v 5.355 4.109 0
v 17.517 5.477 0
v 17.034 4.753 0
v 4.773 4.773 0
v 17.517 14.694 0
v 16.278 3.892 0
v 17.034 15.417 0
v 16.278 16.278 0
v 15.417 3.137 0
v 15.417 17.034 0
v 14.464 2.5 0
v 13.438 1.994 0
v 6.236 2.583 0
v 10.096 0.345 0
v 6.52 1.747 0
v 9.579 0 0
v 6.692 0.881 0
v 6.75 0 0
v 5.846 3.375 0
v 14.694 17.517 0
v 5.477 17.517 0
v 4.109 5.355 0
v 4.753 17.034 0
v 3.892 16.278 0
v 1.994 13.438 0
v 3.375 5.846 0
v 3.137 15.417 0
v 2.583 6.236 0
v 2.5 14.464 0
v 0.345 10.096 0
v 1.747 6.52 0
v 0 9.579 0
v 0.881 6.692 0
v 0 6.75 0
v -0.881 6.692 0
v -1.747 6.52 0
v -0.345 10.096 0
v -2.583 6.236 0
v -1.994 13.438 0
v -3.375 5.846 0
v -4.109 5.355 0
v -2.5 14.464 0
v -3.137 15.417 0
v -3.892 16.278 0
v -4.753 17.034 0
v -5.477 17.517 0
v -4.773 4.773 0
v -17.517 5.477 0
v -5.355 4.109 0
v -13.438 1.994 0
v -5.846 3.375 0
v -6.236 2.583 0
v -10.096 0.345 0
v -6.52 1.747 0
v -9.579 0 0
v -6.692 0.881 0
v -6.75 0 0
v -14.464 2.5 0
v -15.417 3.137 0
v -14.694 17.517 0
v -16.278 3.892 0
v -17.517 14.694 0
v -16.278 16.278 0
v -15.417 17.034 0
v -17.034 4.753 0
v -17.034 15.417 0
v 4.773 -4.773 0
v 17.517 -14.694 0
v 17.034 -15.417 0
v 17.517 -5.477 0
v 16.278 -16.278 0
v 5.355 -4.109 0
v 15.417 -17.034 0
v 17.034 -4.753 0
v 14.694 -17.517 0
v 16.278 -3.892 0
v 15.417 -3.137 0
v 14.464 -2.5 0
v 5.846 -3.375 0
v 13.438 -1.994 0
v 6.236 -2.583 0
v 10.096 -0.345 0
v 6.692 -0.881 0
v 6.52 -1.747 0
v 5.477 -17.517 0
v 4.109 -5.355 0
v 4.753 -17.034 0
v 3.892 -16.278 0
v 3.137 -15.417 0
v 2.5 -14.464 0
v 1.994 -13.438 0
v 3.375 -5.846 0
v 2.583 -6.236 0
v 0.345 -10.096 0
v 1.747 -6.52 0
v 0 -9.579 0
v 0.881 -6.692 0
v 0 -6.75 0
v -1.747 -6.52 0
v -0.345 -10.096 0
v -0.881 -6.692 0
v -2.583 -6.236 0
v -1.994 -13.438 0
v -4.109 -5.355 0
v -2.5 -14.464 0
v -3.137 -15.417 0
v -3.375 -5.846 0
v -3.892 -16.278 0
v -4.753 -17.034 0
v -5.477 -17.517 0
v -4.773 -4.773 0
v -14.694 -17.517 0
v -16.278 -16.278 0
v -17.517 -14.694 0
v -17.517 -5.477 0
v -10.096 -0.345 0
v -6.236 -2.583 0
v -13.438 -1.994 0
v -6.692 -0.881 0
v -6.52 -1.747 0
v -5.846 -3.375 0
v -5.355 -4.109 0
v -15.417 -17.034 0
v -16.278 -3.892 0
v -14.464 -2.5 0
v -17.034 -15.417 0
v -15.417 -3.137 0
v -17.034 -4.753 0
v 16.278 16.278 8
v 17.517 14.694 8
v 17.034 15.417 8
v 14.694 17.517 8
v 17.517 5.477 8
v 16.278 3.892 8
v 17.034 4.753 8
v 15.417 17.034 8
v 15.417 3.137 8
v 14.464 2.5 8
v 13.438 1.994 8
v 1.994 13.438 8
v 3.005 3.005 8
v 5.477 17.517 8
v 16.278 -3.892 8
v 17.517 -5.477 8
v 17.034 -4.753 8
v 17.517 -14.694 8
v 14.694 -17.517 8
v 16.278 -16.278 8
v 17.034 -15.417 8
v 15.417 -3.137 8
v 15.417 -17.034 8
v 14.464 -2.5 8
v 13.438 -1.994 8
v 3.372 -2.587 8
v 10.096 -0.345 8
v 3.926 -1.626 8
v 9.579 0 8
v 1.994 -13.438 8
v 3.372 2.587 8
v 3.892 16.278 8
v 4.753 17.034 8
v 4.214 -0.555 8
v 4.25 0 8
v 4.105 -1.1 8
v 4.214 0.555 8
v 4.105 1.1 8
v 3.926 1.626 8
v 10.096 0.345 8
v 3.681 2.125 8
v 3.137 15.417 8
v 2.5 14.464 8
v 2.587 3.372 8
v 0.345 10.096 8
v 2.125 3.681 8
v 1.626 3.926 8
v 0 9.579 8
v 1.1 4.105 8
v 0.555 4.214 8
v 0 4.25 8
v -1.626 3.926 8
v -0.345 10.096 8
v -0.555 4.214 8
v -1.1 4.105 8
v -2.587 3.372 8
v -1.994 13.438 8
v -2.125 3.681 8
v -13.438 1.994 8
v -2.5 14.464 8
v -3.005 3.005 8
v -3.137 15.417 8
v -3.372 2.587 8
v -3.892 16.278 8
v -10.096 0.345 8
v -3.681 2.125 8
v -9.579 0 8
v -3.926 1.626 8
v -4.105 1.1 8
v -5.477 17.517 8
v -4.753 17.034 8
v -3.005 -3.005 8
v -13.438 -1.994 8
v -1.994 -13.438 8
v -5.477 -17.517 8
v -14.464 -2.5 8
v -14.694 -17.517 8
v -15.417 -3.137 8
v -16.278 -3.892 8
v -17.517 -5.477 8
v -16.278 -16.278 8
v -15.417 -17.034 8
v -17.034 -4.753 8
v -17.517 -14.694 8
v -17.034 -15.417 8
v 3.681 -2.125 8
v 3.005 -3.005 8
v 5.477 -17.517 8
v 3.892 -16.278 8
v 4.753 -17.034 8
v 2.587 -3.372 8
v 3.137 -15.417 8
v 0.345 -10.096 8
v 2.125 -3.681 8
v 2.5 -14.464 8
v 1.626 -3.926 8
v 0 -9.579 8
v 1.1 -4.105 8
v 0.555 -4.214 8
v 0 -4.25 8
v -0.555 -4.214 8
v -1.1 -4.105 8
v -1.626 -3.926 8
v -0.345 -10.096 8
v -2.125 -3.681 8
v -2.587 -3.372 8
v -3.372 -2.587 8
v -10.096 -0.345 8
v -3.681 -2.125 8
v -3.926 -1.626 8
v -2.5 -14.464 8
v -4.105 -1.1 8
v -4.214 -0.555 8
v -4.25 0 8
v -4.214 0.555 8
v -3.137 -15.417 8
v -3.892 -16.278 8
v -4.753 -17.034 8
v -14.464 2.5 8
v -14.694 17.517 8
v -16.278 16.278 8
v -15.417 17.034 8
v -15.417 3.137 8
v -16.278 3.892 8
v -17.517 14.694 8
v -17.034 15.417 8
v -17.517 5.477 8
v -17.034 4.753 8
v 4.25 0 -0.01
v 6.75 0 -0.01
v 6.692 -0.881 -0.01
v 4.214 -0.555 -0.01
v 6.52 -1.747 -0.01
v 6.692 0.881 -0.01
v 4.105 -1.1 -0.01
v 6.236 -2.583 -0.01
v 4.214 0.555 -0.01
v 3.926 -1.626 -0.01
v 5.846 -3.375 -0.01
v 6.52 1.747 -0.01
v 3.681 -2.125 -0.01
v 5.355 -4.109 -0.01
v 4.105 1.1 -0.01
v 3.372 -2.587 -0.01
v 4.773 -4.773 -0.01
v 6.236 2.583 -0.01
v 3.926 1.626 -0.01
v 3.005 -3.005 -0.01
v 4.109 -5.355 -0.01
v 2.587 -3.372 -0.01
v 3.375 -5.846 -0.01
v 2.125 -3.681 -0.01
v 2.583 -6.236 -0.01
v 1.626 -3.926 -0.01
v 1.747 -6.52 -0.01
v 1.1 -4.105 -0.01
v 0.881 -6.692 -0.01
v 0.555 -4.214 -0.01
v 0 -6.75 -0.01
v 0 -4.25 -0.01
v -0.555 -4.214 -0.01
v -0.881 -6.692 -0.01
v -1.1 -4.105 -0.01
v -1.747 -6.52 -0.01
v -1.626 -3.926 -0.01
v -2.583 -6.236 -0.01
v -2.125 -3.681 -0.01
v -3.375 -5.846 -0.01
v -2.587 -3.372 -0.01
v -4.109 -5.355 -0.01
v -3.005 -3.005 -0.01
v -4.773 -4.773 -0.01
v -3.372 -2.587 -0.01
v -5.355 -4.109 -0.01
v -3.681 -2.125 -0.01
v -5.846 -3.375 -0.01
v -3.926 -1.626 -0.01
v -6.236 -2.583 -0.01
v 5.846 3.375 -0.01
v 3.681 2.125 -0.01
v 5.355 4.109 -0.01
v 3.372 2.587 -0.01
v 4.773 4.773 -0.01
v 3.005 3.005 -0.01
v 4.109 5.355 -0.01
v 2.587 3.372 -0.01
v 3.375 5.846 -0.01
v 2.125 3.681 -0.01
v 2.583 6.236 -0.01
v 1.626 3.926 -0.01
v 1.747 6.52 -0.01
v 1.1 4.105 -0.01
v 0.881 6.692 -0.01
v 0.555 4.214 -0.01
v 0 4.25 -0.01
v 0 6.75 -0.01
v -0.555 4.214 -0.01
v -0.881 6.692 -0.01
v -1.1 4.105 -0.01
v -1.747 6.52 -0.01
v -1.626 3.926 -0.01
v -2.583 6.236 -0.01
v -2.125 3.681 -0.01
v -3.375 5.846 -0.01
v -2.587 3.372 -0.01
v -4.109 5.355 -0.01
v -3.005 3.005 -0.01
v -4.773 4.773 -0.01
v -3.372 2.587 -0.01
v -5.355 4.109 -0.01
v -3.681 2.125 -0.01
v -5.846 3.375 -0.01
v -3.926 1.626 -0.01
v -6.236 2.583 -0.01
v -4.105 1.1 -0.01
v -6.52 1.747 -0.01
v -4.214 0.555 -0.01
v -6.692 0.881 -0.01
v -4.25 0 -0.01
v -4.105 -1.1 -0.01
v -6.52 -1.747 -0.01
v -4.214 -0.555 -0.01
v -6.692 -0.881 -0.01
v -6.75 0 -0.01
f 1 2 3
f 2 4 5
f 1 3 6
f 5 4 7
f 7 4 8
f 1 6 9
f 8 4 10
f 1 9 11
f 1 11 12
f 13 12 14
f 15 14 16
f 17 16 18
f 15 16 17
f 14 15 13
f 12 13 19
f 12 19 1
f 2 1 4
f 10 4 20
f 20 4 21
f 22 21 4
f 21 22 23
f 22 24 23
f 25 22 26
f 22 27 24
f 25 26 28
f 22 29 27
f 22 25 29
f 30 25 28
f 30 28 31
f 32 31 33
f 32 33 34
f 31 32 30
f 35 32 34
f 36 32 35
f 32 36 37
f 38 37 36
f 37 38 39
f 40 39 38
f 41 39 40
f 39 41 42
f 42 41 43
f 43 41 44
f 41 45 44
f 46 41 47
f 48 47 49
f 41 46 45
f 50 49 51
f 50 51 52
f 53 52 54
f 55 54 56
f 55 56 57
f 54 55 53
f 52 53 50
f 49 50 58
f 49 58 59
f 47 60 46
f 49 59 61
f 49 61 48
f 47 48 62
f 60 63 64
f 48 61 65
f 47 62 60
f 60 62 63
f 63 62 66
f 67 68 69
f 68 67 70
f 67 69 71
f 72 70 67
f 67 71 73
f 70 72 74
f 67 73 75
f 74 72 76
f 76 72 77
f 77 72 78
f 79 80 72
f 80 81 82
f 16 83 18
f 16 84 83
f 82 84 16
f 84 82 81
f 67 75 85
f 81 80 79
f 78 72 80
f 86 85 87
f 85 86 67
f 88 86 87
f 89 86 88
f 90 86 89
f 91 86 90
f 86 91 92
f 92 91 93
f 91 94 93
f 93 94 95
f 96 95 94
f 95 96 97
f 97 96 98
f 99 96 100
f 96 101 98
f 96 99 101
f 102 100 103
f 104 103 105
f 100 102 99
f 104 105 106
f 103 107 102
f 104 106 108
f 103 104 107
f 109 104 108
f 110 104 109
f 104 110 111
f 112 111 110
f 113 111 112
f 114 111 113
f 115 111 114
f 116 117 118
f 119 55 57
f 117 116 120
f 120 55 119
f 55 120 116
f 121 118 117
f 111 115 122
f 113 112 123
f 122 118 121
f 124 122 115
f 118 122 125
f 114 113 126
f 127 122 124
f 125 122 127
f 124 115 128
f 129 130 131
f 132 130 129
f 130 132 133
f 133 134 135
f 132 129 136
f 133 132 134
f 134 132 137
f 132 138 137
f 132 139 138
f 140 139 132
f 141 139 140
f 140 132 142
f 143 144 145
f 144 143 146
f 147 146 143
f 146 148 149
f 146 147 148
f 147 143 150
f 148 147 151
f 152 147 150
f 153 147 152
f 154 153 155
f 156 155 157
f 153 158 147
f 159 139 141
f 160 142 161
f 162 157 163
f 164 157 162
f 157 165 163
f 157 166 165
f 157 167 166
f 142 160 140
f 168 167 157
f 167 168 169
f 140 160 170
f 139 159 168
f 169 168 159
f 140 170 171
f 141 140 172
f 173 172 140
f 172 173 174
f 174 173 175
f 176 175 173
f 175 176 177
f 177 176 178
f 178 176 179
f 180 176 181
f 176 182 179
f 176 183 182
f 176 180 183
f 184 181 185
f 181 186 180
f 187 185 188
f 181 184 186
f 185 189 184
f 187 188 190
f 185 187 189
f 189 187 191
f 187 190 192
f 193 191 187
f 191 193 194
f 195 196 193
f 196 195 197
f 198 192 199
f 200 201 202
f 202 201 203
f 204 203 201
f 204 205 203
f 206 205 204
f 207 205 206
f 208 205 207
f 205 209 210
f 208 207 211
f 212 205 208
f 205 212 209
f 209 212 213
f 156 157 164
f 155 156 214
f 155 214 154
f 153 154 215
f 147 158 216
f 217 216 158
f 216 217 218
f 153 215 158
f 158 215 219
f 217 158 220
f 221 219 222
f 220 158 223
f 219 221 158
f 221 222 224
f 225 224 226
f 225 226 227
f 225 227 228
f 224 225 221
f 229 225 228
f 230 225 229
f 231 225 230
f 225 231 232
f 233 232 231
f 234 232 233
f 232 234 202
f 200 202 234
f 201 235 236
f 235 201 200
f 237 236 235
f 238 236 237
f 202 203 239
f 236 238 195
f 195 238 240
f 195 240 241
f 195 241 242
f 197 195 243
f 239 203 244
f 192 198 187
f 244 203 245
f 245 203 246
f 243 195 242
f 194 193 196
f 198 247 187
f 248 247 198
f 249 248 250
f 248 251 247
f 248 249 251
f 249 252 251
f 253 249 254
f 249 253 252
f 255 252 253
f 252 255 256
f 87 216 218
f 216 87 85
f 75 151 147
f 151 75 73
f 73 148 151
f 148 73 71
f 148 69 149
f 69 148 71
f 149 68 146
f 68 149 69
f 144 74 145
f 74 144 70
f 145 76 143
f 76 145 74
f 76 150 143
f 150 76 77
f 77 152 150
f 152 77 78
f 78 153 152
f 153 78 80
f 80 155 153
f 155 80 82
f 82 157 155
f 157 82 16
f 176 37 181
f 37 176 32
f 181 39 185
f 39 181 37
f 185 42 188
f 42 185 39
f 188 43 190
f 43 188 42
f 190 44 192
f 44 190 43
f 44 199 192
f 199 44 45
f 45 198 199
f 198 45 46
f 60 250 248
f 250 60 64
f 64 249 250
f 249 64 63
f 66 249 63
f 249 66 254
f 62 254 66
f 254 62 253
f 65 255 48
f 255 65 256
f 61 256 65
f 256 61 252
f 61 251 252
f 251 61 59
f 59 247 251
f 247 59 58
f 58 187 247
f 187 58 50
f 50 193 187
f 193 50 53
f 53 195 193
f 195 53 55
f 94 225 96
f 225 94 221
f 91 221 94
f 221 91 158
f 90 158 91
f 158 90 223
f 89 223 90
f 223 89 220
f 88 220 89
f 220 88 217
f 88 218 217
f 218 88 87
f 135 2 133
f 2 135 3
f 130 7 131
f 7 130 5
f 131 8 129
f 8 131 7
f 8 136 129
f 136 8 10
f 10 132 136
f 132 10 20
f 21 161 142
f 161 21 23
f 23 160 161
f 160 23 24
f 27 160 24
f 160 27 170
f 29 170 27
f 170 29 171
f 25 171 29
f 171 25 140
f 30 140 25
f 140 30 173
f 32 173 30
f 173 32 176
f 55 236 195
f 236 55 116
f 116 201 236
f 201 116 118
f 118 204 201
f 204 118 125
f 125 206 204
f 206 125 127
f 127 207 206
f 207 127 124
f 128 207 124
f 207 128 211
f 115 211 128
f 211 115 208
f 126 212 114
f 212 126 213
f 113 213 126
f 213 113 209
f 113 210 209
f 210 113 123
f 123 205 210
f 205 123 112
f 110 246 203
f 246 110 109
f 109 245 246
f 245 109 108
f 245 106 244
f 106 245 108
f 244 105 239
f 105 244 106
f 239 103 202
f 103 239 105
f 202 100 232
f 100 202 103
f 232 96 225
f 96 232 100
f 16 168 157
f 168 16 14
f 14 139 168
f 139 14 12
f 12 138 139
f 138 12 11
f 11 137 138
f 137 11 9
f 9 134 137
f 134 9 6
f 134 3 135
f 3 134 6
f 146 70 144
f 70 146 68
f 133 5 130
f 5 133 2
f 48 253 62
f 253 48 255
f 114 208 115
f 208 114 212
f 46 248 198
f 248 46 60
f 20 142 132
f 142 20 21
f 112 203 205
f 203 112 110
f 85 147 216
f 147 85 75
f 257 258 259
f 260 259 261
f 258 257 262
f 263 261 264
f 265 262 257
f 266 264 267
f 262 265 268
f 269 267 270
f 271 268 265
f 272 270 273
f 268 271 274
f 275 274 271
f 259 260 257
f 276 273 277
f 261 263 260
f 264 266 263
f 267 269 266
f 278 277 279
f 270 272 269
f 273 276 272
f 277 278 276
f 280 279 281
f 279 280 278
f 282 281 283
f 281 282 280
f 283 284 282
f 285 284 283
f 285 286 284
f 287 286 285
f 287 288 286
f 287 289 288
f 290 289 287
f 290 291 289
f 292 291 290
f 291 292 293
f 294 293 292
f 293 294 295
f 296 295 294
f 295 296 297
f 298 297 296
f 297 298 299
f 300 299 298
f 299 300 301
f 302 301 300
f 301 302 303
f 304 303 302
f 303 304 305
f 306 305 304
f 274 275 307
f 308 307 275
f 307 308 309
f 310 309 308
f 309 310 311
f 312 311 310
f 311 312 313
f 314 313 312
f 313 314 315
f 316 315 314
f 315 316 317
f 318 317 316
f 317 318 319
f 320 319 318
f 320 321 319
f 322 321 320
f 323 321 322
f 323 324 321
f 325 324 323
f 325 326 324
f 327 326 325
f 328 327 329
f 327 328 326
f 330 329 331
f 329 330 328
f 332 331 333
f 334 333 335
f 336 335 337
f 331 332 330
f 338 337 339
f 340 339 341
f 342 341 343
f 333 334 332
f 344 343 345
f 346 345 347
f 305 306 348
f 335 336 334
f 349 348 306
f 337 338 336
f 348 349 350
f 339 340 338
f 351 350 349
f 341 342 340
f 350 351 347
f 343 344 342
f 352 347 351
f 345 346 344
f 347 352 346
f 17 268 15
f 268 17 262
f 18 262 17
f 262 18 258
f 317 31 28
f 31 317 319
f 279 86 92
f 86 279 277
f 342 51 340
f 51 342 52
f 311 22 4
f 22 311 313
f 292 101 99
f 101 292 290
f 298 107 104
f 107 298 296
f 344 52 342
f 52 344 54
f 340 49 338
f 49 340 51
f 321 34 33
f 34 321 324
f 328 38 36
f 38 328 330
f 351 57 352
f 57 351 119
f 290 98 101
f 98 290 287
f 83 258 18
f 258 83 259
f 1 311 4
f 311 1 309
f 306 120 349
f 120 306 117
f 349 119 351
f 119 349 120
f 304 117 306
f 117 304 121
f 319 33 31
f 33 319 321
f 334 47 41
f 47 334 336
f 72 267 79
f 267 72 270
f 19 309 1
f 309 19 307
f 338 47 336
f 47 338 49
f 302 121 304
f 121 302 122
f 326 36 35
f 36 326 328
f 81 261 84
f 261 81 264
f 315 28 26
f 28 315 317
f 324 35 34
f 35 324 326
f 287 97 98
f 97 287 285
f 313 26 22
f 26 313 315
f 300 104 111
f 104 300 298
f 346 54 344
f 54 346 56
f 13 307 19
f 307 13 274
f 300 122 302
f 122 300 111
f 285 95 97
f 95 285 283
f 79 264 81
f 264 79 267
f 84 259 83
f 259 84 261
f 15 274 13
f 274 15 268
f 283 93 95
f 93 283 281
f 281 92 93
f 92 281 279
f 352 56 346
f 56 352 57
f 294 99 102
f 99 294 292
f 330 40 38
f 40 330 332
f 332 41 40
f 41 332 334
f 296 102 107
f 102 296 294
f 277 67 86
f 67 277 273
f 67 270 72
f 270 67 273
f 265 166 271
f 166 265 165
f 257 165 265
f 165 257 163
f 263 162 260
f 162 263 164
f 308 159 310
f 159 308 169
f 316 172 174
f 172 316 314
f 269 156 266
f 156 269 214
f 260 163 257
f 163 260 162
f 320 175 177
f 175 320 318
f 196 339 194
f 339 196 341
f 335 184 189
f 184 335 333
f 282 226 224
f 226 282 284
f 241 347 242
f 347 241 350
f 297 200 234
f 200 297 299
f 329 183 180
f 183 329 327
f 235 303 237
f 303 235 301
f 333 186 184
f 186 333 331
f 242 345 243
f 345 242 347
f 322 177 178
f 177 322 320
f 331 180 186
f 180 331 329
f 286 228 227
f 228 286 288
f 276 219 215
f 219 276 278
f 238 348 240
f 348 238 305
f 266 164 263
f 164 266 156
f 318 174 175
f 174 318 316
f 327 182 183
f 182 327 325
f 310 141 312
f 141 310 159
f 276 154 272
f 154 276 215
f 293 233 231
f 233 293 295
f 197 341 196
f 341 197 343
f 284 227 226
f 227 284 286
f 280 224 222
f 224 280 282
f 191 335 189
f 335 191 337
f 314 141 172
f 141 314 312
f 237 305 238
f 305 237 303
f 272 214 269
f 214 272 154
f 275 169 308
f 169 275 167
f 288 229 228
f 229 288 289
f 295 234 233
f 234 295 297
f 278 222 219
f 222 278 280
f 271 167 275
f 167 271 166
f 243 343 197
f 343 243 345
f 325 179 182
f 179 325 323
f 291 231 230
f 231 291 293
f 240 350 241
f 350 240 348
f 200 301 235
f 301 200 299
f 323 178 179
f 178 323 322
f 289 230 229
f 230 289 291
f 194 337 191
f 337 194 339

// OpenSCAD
// file: teardrop.scad
module teardrop (r=4.5,h=20,top_and_bottom=false)
{
	rotate([-270,0,90])
	linear_extrude(height=h,convexity=10)
	{
		circle(r=r);
		polygon(points=[[0,0],[r*cos(30),r*sin(30)],[0.5*r,r],[-0.5*r,r],[-r*cos(30),r*sin(30)]],
				paths=[[0,1,2,3,4]]);
		if (top_and_bottom)
		polygon(points=[[0,0],[r*cos(30),-r*sin(30)],[0.5*r,-r],[-0.5*r,-r],[-r*cos(30),-r*sin(30)]],
				paths=[[0,1,2,3,4]]);
		
	}
}

module teardropcentering (r=4.5,h=20)
{
	rotate([-270,0,90])
	linear_extrude(height=h)
	{
		circle(r=r, $fn = 24);
		polygon(points=[[0,0],[r*cos(30),r*sin(30)],[0.5*r,1.2*r],[-0.5*r,1.2*r],[-r*cos(30),r*sin(30)]],
				paths=[[0,1,2,3,4]]);
	}
}

module teardropcentering2 (r=4.5,h=20)
{
	//rotate([-270,0,90])
	difference(){
	linear_extrude(height=h)
	{
		circle(r=r, $fn = 24);
		polygon(points=[[0,0],[r*cos(30),r*sin(30)],[0.5*r,1.2*r],[-0.5*r,1.2*r],[-r*cos(30),r*sin(30)]],
				paths=[[0,1,2,3,4]]);
	}
	translate(v = [-1.5*r, -1.5*r,-1])cube(size =[3*r,1.5*r,h+2]);
	}
}
// file: barbell.scad
/*
 *  This program is free software; you can redistribute it and/or modify
 *  it under the terms of the GNU General Public License as published by
 *  the Free Software Foundation; either version 3 of the License,
 *  LGPL version 2.1, or (at your option) any later version of the GPL.
 *
 *  This program is distributed in the hope that it will be useful,
 *  but WITHOUT ANY WARRANTY; without even the implied warranty of
 *  MERCHANTABILITY or FITNESS FOR A PARTICULAR PURPOSE.  See the
 *  GNU General Public License for more details.
 *
 *  You should have received a copy of the GNU General Public License
 *  along with this program; if not, write to the Free Software
 *  Foundation, Inc., 59 Temple Place, Suite 330, Boston, MA 02111-1307 USA
 *
*/

module barbell (r1,r2,r3,r4,separation) 
{
	x1=[0,0];
	x2=[separation,0];
	x3=triangulate (x1,x2,r1+r3,r2+r3);
	x4=triangulate (x2,x1,r2+r4,r1+r4);
	render()
	difference ()
	{
		union()
		{
			translate(x1)
			circle (r=r1);
			translate(x2)
			circle(r=r2);
			polygon (points=[x1,x3,x2,x4]);
		}
		translate(x3)
		circle(r=r3,$fa=5);
		translate(x4)
		circle(r=r4,$fa=5);
	}
}


function triangulate (point1, point2, length1, length2) = 
point1 + 
length1*rotated(
atan2(point2[1]-point1[1],point2[0]-point1[0])+
angle(distance(point1,point2),length1,length2));

function distance(point1,point2)=
sqrt((point1[0]-point2[0])*(point1[0]-point2[0])+
(point1[1]-point2[1])*(point1[1]-point2[1]));

function angle(a,b,c) = acos((a*a+b*b-c*c)/(2*a*b)); 

function rotated(a)=[cos(a),sin(a),0];
// file: utilities.scad
/*
 * Utility functions.
 *
 * Originally by Hans Häggström, 2010.
 * Dual licenced under Creative Commons Attribution-Share Alike 3.0 and LGPL2 or later
 */

//include <units.scad>


/******************** Disance Poins ******************************/
function distance3D(a,b) =sqrt( (a[0] - b[0])*(a[0] - b[0]) +
                                (a[1] - b[1])*(a[1] - b[1]) +
                                (a[2] - b[2])*(a[2] - b[2]) );
//Obsolet
function distance(a, b) = distance3D(a,b);

function distance2D(a,b) = sqrt( (a[0] - b[0])*(a[0] - b[0]) +
                                (a[1] - b[1])*(a[1] - b[1]));
								
function distance1D(a,b) = sqrt(a*a+b*b);
//Obsolet
function length2(a) = distance1D(a[0],a[1]);


/************************ vector *************************/
function normalized(a) = a / (max(distance3D([0,0,0], a), 0.00001));

function normalized_axis(a) = a == "x" ? [1, 0, 0]:
                   a == "y" ? [0, 1, 0]:
                   a == "z" ? [0, 0, 1]: normalized(a);

function angleOfNormalizedVector(n) = [0, -atan2(n[2], distance1D([n[0], n[1]])), atan2(n[1], n[0]) ];

function angle(v) = angleOfNormalizedVector(normalized(v));

function angleBetweenTwoPoints(a, b) = angle(normalized(b-a));

function _angleVectore2D(a) = atan2(a[0],a[1]);
function angle_betweentTwoPoints2D (a,b) = _angleVectore2D(b-a);


/********************** Circel ***************************/

function circel_area(r) = PI * r * r;

function circel_radius3Points(a,b,c) = (distance2D(a,b) * distance2D(b,c) * distance2D(c,a)) / (4 * triangle_area3Points(a,b,c));

function circel_radius3lengths(a,b,c) = (a*b*c) / (4 * triangle_area3lengths(a,b,c));


/********************** triangle **************************/
//Satz des Heron
function triangle_area3lengths(a,b,c) = sqrt((a+b+c)*(a+b-c)*(b+c-a)*(c+a-b))/4;

function triangle_area3Points(a,b,c) = triangle_area3lengths(distance2D(a,b),distance2D(b,c),distance2D(c,a));



/************************** coordinate systems translation ****/
//[radius,phi] <=> [x,y]
function conv2D_cartesian2polar(x) = [ distance1D(x[0],x[1]) , atan2(x[1],x[0]) ];
function conv2D_polar2cartesian(x) = [ x[0]*cos(x[1]) , x[0]*sin(x[1]) ];


CENTER = 0;
LEFT = -0.5;
RIGHT = 0.5;
TOP = 0.5;
BOTTOM = -0.5;

FlatCap =0;
ExtendedCap =0.5;
CutCap =-0.5;


module fromTo(from=[0,0,0], to=[1,0,0], size=[1, 1], align=[CENTER, CENTER], material=[0.5, 0.5, 0.5], name="", endExtras=[0,0], endCaps=[FlatCap, FlatCap], rotation=[0,0,0], printString=true) {

  angle = angleBetweenTwoPoints(from, to);
  length = distance(from, to) + endCaps[0]*size[0] + endCaps[1]*size[0] + endExtras[0] + endExtras[1];

  if (length > 0) {
    if (printString) echo(str( "  " ,name, " ", size[0], "mm x ", size[1], "mm, length ", length, "mm"));

    color(material)
      translate(from)
        rotate(angle)
          translate( [ -endCaps[0]*size[0] - endExtras[0], size[0]*(-0.5-align[0]), size[1]*(-0.5+align[1]) ] )
            rotate(rotation)
              scale([length, size[0], size[1]]) child();
  }
}

module part(name) {
  echo("");
  echo(str(name, ":"));
}
// file: roundEdges.scad
/*
 *  Copyright (C) 2012  Krallinger Sebastian
 *
 *  This program is free software; you can redistribute it and/or modify
 *  it under the terms of the GNU General Public License as published by
 *  the Free Software Foundation; either version 3 of the License,
 *  LGPL version 2.1, or (at your option) any later version of the GPL.
 *
 *  This program is distributed in the hope that it will be useful,
 *  but WITHOUT ANY WARRANTY; without even the implied warranty of
 *  MERCHANTABILITY or FITNESS FOR A PARTICULAR PURPOSE.  See the
 *  GNU General Public License for more details.
 *
 *  You should have received a copy of the GNU General Public License
 *  along with this program; if not, write to the Free Software
 *  Foundation, Inc., 59 Temple Place, Suite 330, Boston, MA 02111-1307 USA
 *
*/


//Rounded Edges
module roundEdge(_a=0,_r=1,_l=1,_fn=100){
	rotate (a=[0,0,_a]){
		translate(v=[_r,_r,0]){
			rotate (a=[0,0,0]) rotate (a=[0,0,180]){
				difference() {
					translate (v=[-OS/2,-OS/2,-OS/2])
						cube (size = [_r+OS,_r+OS,_l+OS],center=false );
					translate (v=[0,0,-OS*2/2])
						cylinder (h = _l+OS*2, r=_r, center = false, $fn=_fn);
				}
			}
		}
	}
}
//roundEdge(_a=0,_l=10);
// file: metric.scad
// PRUSA Mendel  
// Default metric sizes
// GNU GPL v2
// Josef Průša
// josefprusa@me.com
// prusadjs.cz
// http://www.reprap.org/wiki/Prusa_Mendel
// http://github.com/prusajr/PrusaMendel

// RODS

threaded_rod_diameter      = 8.2;
smooth_bar_diameter        = 8;

// Nuts and bolts
// For all nuttraps and screw holse 
m8_diameter                = 8.9;
m8_nut_diameter            = 15.3;
m8_nut_wallDist            = _wallDistFromDia(m8_nut_diameter);
m8_nut_heigth              = 6.3;

m4_diameter                = 4.5;
m4_nut_diameter            = 8.1;
m4_nut_heigth              = 3.2;

m3_diameter                = 3.6;
m3_nut_diameter            = 6.45;
m3_nut_heigth              = 2.3;
m3_nut_wallDist            = _wallDistFromDia(m3_nut_diameter);
m3_nut_diameter_horizontal = 6.1;

// elongetaed nuttraps
// where a nut is put in an slot and inthere hits the perpendicular threadhole
m3_elongNtt_tolerance      = [0.5,0,0.5];// additional [diameter,depth,height]  // depth is not implemented

// linear Bearings
lber_length                = 24;
lber_diam                  = 15.3;

// Motors

motor_shaft                = 5.5;


/******************************************************************************/ 
/*                                  INTERNAL                                  */
/******************************************************************************/
/*-----------------!!! do not change things below this !!!--------------------*/
m3_elongNtt_diameter = m3_nut_diameter + m3_elongNtt_tolerance[0];
m3_elongNtt_wallDist = _wallDistFromDia(m3_elongNtt_diameter);
m3_elongNtt_height = m3_nut_heigth + m3_elongNtt_tolerance[2];



function _wallDistFromDia(dia) = cos(30)*dia;
// file: units.scad
/*
 * Basic units.
 * 
 * Originally by Hans Häggström, 2010.
 * Dual licenced under Creative Commons Attribution-Share Alike 3.0 and LGPL2 or later
 */


mm = 1;
cm = 10 * mm;
dm = 100 * mm;
m = 1000 * mm;

inch = 25.4 * mm;

X = [1, 0, 0];
Y = [0, 1, 0];
Z = [0, 0, 1];

M3 = 3*mm;
M4 = 4*mm;
M5 = 5*mm;
M6 = 6*mm;
M8 = 8*mm;


// When a small distance is needed to overlap shapes for boolean cutting, etc.
epsilon = 0.01*mm;
OS = epsilon;  // Over size
// main file
/* H-Y-supportFootEnd [Ysf]
 * Copyright (c) 2012 by Krallinger Sebastian [s.krallinger+cc@gmail.com]
 * 
 * Creative Commons Attribution-ShareAlike 3.0 (CC BY-SA) [http://creativecommons.org/licenses/by-sa/3.0/]
 * original desing by abdrumm for the PrintrBot
 */

include <units.scad>;
include <metric.scad>
include <roundEdges.scad>
include <utilities.scad>
include <barbell.scad>
use <teardrop.scad>


/*------------------------------------general---------------------------------*/
Ysf_mode = "print";  // can be print or inspect [overlays the Ysf_model with the original Ysf_model] (uncomment next line)
Ysf_mode = "inspect";
$fn=48;

Ysf_thinWallThickness          = 1;
Ysf_genWallThickness           = 2.5;
Ysf_strongWallThickness        = 8;

Ysf_horizontalSuportThickness  = 0.3;
Ysf_verticalSupportThickness   = 0.5;

/*------------------------------------rod-------------------------------------*/
Ysf_roughRod_diam                   = 8.5;

/*------------------------------------supportFootEnd--------------------------*/
Ysf_sFooEnd_size = [(8.267+9.25)*2,(8.267+9.25)*2,Ysf_strongWallThickness];

/******************************************************************************/ 
/*                                  INTERNAL                                  */
/******************************************************************************/
_Ysf_acrossStrive_angle = atan(Ysf_sFooEnd_size[0]/Ysf_sFooEnd_size[1]);
_Ysf_acrossStrive_diam = min(Ysf_sFooEnd_size[0],Ysf_sFooEnd_size[1])/4;
_Ysf_acrossStrive_length = distance1D(Ysf_sFooEnd_size[0],Ysf_sFooEnd_size[1])-_Ysf_acrossStrive_diam*2.4;

module  H_Y_supportFootEnd() {
	difference() {
		union(){
			translate([0, 0, -OS]) 
				cylinder(r=Ysf_roughRod_diam/2+Ysf_genWallThickness, h=Ysf_sFooEnd_size[2], center=false);

			intersection() {
			translate([0, 0, Ysf_sFooEnd_size[2]/2]) 
				cube(size=Ysf_sFooEnd_size, center=true);

			for (i=[0,1])
			rotate(a=90*i-_Ysf_acrossStrive_angle,v=Z) 
			translate([-_Ysf_acrossStrive_length/2, 0, 0]) 
			linear_extrude(height=Ysf_sFooEnd_size[2])
				barbell (r1=_Ysf_acrossStrive_diam,r2=_Ysf_acrossStrive_diam,r3=_Ysf_acrossStrive_length,r4=_Ysf_acrossStrive_length,separation=_Ysf_acrossStrive_length);
			}
		}
		union(){
			translate([0, 0, -OS]) 
				cylinder(r=Ysf_roughRod_diam/2, h=Ysf_sFooEnd_size[2]+2*OS, center=false);
		}
	}
	

}


if (Ysf_mode == "inspect") {
	H_Y_supportFootEnd();
}
module H_Y_supportFootEnd_print() {
	H_Y_supportFootEnd();
}
if (Ysf_mode == "print") {
	H_Y_supportFootEnd_print();
}
